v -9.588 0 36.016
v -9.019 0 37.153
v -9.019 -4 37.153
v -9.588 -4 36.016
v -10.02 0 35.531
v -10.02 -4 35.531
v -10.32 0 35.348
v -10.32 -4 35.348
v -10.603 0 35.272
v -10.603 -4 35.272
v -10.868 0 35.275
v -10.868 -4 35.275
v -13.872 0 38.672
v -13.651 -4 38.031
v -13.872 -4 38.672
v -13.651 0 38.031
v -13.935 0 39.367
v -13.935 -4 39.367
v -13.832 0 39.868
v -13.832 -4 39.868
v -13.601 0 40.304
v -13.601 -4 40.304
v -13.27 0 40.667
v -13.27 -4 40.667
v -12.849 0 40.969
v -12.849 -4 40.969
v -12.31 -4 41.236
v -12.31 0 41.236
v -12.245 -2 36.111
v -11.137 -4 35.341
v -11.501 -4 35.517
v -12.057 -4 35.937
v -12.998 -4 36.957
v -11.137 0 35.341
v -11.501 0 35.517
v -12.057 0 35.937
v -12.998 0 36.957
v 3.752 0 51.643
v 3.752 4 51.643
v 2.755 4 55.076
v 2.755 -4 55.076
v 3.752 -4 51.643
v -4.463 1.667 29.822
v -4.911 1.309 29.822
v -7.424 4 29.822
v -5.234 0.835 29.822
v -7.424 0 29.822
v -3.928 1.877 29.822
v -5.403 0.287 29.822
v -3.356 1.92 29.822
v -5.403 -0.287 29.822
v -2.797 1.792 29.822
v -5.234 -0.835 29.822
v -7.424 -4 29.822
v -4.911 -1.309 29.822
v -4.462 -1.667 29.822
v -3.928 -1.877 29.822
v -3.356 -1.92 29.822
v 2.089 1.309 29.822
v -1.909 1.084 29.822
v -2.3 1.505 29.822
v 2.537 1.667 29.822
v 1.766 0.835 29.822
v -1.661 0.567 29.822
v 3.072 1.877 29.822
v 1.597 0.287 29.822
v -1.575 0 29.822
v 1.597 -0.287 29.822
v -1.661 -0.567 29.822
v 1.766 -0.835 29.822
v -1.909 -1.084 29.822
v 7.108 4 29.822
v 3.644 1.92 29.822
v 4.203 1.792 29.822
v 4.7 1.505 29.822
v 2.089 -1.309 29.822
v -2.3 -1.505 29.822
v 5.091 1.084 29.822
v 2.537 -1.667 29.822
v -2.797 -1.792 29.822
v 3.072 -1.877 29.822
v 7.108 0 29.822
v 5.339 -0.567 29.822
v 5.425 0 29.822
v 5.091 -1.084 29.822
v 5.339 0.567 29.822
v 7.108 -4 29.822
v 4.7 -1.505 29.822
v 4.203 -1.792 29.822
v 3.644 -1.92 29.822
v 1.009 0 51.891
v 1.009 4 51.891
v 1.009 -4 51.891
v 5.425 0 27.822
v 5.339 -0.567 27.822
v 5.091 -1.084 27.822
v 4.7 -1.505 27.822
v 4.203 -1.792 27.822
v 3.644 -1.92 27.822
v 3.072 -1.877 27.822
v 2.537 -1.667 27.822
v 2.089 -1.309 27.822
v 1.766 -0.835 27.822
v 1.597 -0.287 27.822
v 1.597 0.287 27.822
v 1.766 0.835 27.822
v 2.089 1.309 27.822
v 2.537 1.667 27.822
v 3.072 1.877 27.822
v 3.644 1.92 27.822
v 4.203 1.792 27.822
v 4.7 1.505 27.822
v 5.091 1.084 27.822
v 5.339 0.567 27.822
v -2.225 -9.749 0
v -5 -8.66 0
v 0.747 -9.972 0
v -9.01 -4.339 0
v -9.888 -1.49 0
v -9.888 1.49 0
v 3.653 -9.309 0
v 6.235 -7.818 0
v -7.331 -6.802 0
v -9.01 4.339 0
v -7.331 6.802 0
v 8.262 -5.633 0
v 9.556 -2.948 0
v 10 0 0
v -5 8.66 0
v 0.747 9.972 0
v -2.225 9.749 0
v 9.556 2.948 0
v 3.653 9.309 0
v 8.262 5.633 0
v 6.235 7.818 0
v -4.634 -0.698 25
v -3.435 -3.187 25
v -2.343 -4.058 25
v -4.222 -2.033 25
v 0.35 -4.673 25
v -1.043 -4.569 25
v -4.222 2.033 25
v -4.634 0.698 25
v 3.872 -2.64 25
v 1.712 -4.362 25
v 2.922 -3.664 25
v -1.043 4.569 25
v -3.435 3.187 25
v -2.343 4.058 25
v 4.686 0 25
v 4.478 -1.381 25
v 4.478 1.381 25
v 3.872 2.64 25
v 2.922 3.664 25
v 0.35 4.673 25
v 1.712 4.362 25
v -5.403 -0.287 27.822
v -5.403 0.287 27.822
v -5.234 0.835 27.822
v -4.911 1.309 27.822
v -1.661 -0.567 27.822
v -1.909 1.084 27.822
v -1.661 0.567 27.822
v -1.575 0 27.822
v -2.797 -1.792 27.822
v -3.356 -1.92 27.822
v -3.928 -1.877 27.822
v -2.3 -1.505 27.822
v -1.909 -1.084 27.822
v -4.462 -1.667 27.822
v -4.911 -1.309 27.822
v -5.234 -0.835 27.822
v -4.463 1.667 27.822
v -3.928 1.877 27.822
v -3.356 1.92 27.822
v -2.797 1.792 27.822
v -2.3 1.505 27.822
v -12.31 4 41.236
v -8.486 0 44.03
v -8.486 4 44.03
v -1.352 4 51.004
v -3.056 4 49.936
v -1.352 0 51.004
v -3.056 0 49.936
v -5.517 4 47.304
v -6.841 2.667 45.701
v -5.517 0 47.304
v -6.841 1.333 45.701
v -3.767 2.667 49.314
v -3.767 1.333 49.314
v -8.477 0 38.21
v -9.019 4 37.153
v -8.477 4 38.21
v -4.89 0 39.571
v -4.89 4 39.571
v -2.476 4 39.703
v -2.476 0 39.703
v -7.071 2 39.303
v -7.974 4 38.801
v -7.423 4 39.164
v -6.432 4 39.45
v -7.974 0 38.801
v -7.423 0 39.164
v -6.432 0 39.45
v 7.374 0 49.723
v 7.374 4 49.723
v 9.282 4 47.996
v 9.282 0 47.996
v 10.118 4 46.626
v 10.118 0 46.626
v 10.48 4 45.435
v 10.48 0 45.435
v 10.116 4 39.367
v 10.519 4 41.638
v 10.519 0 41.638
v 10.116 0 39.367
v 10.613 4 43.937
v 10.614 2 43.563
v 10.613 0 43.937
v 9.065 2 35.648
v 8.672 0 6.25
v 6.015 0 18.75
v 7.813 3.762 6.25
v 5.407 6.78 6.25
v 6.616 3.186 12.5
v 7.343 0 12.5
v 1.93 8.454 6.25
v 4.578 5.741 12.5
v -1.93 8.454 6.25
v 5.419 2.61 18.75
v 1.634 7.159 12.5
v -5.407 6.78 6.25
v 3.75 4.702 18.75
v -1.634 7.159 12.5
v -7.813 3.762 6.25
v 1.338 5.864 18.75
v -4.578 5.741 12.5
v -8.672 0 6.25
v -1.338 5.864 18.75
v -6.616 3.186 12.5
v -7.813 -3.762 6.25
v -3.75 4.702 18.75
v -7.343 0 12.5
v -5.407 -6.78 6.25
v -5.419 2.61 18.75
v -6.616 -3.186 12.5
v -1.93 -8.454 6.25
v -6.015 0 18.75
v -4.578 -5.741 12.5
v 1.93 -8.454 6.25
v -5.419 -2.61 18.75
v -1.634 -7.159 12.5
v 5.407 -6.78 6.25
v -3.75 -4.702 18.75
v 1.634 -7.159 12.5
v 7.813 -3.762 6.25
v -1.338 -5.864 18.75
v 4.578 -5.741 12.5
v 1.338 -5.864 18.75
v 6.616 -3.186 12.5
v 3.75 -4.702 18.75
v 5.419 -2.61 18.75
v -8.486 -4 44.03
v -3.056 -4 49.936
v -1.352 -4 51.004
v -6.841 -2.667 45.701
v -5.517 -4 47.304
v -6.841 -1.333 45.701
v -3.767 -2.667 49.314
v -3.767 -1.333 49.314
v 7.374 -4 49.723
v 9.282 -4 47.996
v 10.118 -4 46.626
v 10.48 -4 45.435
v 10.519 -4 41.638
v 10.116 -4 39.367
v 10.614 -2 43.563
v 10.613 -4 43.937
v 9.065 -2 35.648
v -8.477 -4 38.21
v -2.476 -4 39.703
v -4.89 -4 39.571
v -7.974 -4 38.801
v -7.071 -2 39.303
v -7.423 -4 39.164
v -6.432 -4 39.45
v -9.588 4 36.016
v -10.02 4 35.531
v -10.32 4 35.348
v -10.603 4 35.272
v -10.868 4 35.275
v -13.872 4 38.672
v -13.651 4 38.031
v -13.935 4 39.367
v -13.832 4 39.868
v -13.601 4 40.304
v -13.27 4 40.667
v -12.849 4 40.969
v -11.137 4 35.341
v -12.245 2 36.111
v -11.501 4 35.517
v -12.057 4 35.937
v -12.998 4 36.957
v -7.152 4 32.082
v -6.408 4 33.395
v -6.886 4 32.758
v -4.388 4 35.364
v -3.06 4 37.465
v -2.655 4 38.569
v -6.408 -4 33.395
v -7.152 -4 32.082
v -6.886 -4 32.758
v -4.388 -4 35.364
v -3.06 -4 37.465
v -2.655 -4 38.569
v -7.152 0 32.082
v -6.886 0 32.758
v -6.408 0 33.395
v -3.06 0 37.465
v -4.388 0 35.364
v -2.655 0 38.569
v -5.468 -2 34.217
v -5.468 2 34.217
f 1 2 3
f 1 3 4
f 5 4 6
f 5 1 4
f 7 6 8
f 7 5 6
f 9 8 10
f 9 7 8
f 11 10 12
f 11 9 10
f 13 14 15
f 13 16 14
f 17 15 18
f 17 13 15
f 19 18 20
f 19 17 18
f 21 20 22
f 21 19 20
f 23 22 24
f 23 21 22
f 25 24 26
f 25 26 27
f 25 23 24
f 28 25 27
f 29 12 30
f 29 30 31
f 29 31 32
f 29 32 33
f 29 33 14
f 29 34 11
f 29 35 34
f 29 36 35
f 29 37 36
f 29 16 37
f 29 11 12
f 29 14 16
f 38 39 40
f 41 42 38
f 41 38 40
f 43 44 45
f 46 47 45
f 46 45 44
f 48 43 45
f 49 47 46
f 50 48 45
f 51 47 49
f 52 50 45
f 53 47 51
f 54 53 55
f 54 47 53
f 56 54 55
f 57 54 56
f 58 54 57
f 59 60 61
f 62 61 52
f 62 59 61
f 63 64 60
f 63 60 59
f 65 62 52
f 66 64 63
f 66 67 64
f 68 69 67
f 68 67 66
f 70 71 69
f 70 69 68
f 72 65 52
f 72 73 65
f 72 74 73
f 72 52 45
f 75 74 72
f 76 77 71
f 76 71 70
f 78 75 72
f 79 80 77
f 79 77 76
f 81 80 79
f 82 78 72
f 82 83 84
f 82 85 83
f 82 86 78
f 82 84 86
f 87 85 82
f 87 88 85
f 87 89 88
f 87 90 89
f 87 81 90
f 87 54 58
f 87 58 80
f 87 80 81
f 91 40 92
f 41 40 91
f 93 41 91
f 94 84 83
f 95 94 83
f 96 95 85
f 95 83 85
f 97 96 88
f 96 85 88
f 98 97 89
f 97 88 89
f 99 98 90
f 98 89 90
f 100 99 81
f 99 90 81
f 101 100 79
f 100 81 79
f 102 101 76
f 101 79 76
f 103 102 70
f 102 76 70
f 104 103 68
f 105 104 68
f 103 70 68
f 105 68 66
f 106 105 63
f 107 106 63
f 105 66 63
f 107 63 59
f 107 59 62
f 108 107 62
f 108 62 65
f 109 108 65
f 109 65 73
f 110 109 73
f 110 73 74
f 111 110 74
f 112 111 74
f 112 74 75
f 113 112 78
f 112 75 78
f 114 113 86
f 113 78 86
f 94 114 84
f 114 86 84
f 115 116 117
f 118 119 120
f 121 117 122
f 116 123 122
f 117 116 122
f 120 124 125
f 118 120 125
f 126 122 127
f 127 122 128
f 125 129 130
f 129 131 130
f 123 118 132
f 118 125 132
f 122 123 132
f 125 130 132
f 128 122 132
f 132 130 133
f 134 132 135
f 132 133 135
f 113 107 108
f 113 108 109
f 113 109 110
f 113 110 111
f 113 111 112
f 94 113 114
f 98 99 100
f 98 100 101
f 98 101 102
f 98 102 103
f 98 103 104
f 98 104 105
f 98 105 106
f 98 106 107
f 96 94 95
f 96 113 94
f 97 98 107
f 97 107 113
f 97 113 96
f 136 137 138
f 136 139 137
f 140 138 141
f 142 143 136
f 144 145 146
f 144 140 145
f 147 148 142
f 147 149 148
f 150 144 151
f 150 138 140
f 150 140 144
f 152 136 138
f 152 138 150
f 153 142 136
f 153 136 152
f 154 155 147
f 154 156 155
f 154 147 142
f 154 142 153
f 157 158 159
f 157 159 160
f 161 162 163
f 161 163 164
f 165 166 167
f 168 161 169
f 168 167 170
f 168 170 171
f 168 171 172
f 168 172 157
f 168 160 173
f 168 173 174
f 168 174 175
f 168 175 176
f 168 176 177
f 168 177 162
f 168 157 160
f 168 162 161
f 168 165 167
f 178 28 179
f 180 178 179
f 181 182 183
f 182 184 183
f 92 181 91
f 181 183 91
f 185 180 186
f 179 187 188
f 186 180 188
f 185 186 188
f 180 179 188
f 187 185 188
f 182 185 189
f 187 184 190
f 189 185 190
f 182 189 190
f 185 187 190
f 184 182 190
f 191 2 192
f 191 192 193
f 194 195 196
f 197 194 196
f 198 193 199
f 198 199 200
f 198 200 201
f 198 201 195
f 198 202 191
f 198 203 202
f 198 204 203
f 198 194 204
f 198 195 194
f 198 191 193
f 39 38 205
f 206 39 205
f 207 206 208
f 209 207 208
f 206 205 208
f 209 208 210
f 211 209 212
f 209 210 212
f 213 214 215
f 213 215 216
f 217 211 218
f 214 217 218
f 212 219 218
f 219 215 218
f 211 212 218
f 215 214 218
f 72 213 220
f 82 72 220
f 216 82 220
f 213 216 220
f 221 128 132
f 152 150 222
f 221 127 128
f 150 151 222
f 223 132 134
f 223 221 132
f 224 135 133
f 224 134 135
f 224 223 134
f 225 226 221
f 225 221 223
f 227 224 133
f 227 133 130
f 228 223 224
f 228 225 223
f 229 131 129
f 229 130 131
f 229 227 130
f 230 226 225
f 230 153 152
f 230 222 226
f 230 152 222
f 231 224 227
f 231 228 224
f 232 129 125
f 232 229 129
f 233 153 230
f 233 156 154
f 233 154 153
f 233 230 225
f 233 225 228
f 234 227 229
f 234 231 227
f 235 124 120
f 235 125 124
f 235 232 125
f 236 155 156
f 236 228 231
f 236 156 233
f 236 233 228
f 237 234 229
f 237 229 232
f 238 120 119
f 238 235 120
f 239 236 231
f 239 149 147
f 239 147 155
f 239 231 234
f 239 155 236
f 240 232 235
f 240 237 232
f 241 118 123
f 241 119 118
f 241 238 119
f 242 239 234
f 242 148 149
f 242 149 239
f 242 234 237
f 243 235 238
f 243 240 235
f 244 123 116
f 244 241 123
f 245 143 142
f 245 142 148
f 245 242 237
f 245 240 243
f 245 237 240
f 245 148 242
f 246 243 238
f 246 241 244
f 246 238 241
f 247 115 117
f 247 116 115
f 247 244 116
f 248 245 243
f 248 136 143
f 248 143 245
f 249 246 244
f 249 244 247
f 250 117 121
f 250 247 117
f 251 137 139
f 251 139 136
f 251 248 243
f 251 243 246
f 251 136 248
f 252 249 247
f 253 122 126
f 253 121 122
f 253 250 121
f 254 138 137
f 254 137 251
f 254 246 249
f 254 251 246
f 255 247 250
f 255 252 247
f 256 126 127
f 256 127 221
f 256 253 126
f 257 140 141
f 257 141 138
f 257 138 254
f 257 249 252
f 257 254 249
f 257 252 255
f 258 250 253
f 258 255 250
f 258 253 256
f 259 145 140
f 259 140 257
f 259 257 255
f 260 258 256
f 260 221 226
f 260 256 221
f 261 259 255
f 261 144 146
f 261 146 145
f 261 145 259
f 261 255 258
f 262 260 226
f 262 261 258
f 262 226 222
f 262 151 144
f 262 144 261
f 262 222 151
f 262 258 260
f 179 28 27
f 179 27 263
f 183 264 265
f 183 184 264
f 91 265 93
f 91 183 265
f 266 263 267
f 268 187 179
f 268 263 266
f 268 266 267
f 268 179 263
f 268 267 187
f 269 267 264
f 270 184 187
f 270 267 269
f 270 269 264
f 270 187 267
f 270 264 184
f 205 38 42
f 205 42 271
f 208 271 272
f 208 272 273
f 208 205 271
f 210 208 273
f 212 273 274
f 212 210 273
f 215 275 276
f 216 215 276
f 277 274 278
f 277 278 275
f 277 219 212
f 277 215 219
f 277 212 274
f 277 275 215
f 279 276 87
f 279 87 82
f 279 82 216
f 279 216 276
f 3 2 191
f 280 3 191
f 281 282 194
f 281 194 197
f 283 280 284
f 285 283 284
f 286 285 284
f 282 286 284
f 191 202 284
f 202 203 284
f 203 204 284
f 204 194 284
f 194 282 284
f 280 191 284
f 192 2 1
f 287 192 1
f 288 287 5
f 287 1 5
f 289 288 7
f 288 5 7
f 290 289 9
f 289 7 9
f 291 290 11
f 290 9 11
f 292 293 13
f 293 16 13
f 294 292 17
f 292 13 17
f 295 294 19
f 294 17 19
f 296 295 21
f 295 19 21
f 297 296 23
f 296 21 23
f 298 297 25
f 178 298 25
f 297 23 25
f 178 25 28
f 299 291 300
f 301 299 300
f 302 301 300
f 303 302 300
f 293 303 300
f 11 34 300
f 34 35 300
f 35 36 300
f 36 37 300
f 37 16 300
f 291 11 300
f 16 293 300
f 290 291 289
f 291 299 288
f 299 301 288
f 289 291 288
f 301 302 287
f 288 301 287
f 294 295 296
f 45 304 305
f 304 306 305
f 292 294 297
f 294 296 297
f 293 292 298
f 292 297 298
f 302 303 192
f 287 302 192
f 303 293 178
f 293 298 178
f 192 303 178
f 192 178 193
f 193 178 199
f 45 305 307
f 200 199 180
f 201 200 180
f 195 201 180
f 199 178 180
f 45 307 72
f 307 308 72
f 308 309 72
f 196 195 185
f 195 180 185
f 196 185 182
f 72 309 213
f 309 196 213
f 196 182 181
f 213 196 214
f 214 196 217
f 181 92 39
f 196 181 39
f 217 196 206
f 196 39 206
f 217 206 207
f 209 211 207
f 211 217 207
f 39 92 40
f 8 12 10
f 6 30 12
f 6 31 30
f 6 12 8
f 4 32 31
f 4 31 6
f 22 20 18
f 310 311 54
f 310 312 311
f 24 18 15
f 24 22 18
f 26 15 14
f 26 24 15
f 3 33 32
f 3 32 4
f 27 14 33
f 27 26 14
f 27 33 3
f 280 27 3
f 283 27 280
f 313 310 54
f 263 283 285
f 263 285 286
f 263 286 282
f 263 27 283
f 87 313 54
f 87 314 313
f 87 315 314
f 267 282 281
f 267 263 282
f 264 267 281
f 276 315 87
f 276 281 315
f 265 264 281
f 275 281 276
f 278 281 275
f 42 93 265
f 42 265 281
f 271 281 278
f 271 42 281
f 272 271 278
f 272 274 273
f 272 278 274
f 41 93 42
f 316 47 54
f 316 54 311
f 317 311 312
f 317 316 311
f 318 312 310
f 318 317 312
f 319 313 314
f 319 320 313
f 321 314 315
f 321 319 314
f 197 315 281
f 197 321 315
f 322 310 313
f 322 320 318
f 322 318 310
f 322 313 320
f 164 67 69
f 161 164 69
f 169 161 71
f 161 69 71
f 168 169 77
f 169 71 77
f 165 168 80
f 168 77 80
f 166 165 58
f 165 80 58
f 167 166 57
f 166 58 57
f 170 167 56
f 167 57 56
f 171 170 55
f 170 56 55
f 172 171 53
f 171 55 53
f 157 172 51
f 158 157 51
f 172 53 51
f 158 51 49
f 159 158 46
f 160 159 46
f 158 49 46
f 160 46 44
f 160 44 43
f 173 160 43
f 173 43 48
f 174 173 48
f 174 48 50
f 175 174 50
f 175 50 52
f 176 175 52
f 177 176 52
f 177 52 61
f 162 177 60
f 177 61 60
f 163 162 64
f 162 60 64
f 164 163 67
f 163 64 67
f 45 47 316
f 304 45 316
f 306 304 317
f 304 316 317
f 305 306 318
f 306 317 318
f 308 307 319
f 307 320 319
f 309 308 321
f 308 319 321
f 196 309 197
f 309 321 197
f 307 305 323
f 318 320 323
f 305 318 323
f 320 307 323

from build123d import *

# Parameters (mm, degrees)
F3_R     = 10
F4_DEPTH = 25
F4_TAPER = 12
F6_DEPTH = 4
F7_R     = 1.925
F8_DEPTH = 2


with BuildPart() as f4:
    # F3 (on Top) → F4 (new body)
    with BuildSketch(Plane.XY):
        Circle(F3_R)
    extrude(amount=F4_DEPTH, taper=F4_TAPER)


with BuildPart() as f6:
    # F5 (on Front) → F6 (new body, symmetric)
    with BuildSketch(Plane.XZ):
        with BuildLine():
            Line((2.7545168996, 55.0759210778), (1.0090367869, 51.890943159))
            add(Edge.make_bspline(
                [(-12.3098591853, 41.2358080065), (-4.2772642086, 46.0641489872), (-5.9833362078, 49.8947376602), (1.0090367869, 51.890943159)],
                knots=[0, 0, 0, 0, 17.0565206016, 17.0565206016, 17.0565206016, 17.0565206016], degree=3))
            add(Edge.make_bspline(
                [(-9.0189639417, 37.1525069193), (-9.9801826199, 34.6635860085), (-12.4437455483, 35.3962825063), (-15.1802037206, 40.0572151531), (-12.3098591853, 41.2358080065)],
                knots=[0, 0, 0, 0, 0.4485145781, 1, 1, 1, 1], degree=3))
            add(Edge.make_bspline(
                [(-9.0189639417, 37.1525069193), (-8.5638371082, 38.2034996324), (-7.5634908743, 39.9265074419), (-3.4559620028, 39.4761695976), (-2.4762957511, 39.7033232817)],
                knots=[0, 0, 0, 0, 0.4423119337, 1, 1, 1, 1], degree=3))
            add(Edge.make_bspline(
                [(-7.4235480266, 29.8215409847), (-7.3369486536, 33.0697739436), (-5.6790646776, 33.4130882805), (-2.5604610159, 37.5395536743), (-2.4762957511, 39.7033232817)],
                knots=[0, 0, 0, 0, 0.4673445989, 1, 1, 1, 1], degree=3))
            Line((-7.4235480266, 29.8215409847), (7.107638139, 29.8215409847))
            add(Edge.make_bspline(
                [(3.7516681477, 51.6433044864), (10.4158277179, 48.8581646653), (10.8636567466, 42.4888634106), (10.3009866199, 38.9651989585), (7.107638139, 29.8215409847)],
                knots=[0, 0, 0, 0, 0.4636828584, 1, 1, 1, 1], degree=3))
            Line((3.7516681477, 51.6433044864), (2.7545168996, 55.0759210778))
        make_face()
    extrude(amount=F6_DEPTH, both=True)

    # F7 (on face) → F8 (join)
    with BuildSketch(Plane(origin=(0, 0, 29.8215409847), x_dir=(1, 0, 0), z_dir=(0, 0, -1))):
        with Locations((-3.5, 0)):
            Circle(F7_R)
        with Locations((3.5, 0)):
            Circle(F7_R)
    extrude(amount=F8_DEPTH)


solid = Compound([f4.part, f6.part])
